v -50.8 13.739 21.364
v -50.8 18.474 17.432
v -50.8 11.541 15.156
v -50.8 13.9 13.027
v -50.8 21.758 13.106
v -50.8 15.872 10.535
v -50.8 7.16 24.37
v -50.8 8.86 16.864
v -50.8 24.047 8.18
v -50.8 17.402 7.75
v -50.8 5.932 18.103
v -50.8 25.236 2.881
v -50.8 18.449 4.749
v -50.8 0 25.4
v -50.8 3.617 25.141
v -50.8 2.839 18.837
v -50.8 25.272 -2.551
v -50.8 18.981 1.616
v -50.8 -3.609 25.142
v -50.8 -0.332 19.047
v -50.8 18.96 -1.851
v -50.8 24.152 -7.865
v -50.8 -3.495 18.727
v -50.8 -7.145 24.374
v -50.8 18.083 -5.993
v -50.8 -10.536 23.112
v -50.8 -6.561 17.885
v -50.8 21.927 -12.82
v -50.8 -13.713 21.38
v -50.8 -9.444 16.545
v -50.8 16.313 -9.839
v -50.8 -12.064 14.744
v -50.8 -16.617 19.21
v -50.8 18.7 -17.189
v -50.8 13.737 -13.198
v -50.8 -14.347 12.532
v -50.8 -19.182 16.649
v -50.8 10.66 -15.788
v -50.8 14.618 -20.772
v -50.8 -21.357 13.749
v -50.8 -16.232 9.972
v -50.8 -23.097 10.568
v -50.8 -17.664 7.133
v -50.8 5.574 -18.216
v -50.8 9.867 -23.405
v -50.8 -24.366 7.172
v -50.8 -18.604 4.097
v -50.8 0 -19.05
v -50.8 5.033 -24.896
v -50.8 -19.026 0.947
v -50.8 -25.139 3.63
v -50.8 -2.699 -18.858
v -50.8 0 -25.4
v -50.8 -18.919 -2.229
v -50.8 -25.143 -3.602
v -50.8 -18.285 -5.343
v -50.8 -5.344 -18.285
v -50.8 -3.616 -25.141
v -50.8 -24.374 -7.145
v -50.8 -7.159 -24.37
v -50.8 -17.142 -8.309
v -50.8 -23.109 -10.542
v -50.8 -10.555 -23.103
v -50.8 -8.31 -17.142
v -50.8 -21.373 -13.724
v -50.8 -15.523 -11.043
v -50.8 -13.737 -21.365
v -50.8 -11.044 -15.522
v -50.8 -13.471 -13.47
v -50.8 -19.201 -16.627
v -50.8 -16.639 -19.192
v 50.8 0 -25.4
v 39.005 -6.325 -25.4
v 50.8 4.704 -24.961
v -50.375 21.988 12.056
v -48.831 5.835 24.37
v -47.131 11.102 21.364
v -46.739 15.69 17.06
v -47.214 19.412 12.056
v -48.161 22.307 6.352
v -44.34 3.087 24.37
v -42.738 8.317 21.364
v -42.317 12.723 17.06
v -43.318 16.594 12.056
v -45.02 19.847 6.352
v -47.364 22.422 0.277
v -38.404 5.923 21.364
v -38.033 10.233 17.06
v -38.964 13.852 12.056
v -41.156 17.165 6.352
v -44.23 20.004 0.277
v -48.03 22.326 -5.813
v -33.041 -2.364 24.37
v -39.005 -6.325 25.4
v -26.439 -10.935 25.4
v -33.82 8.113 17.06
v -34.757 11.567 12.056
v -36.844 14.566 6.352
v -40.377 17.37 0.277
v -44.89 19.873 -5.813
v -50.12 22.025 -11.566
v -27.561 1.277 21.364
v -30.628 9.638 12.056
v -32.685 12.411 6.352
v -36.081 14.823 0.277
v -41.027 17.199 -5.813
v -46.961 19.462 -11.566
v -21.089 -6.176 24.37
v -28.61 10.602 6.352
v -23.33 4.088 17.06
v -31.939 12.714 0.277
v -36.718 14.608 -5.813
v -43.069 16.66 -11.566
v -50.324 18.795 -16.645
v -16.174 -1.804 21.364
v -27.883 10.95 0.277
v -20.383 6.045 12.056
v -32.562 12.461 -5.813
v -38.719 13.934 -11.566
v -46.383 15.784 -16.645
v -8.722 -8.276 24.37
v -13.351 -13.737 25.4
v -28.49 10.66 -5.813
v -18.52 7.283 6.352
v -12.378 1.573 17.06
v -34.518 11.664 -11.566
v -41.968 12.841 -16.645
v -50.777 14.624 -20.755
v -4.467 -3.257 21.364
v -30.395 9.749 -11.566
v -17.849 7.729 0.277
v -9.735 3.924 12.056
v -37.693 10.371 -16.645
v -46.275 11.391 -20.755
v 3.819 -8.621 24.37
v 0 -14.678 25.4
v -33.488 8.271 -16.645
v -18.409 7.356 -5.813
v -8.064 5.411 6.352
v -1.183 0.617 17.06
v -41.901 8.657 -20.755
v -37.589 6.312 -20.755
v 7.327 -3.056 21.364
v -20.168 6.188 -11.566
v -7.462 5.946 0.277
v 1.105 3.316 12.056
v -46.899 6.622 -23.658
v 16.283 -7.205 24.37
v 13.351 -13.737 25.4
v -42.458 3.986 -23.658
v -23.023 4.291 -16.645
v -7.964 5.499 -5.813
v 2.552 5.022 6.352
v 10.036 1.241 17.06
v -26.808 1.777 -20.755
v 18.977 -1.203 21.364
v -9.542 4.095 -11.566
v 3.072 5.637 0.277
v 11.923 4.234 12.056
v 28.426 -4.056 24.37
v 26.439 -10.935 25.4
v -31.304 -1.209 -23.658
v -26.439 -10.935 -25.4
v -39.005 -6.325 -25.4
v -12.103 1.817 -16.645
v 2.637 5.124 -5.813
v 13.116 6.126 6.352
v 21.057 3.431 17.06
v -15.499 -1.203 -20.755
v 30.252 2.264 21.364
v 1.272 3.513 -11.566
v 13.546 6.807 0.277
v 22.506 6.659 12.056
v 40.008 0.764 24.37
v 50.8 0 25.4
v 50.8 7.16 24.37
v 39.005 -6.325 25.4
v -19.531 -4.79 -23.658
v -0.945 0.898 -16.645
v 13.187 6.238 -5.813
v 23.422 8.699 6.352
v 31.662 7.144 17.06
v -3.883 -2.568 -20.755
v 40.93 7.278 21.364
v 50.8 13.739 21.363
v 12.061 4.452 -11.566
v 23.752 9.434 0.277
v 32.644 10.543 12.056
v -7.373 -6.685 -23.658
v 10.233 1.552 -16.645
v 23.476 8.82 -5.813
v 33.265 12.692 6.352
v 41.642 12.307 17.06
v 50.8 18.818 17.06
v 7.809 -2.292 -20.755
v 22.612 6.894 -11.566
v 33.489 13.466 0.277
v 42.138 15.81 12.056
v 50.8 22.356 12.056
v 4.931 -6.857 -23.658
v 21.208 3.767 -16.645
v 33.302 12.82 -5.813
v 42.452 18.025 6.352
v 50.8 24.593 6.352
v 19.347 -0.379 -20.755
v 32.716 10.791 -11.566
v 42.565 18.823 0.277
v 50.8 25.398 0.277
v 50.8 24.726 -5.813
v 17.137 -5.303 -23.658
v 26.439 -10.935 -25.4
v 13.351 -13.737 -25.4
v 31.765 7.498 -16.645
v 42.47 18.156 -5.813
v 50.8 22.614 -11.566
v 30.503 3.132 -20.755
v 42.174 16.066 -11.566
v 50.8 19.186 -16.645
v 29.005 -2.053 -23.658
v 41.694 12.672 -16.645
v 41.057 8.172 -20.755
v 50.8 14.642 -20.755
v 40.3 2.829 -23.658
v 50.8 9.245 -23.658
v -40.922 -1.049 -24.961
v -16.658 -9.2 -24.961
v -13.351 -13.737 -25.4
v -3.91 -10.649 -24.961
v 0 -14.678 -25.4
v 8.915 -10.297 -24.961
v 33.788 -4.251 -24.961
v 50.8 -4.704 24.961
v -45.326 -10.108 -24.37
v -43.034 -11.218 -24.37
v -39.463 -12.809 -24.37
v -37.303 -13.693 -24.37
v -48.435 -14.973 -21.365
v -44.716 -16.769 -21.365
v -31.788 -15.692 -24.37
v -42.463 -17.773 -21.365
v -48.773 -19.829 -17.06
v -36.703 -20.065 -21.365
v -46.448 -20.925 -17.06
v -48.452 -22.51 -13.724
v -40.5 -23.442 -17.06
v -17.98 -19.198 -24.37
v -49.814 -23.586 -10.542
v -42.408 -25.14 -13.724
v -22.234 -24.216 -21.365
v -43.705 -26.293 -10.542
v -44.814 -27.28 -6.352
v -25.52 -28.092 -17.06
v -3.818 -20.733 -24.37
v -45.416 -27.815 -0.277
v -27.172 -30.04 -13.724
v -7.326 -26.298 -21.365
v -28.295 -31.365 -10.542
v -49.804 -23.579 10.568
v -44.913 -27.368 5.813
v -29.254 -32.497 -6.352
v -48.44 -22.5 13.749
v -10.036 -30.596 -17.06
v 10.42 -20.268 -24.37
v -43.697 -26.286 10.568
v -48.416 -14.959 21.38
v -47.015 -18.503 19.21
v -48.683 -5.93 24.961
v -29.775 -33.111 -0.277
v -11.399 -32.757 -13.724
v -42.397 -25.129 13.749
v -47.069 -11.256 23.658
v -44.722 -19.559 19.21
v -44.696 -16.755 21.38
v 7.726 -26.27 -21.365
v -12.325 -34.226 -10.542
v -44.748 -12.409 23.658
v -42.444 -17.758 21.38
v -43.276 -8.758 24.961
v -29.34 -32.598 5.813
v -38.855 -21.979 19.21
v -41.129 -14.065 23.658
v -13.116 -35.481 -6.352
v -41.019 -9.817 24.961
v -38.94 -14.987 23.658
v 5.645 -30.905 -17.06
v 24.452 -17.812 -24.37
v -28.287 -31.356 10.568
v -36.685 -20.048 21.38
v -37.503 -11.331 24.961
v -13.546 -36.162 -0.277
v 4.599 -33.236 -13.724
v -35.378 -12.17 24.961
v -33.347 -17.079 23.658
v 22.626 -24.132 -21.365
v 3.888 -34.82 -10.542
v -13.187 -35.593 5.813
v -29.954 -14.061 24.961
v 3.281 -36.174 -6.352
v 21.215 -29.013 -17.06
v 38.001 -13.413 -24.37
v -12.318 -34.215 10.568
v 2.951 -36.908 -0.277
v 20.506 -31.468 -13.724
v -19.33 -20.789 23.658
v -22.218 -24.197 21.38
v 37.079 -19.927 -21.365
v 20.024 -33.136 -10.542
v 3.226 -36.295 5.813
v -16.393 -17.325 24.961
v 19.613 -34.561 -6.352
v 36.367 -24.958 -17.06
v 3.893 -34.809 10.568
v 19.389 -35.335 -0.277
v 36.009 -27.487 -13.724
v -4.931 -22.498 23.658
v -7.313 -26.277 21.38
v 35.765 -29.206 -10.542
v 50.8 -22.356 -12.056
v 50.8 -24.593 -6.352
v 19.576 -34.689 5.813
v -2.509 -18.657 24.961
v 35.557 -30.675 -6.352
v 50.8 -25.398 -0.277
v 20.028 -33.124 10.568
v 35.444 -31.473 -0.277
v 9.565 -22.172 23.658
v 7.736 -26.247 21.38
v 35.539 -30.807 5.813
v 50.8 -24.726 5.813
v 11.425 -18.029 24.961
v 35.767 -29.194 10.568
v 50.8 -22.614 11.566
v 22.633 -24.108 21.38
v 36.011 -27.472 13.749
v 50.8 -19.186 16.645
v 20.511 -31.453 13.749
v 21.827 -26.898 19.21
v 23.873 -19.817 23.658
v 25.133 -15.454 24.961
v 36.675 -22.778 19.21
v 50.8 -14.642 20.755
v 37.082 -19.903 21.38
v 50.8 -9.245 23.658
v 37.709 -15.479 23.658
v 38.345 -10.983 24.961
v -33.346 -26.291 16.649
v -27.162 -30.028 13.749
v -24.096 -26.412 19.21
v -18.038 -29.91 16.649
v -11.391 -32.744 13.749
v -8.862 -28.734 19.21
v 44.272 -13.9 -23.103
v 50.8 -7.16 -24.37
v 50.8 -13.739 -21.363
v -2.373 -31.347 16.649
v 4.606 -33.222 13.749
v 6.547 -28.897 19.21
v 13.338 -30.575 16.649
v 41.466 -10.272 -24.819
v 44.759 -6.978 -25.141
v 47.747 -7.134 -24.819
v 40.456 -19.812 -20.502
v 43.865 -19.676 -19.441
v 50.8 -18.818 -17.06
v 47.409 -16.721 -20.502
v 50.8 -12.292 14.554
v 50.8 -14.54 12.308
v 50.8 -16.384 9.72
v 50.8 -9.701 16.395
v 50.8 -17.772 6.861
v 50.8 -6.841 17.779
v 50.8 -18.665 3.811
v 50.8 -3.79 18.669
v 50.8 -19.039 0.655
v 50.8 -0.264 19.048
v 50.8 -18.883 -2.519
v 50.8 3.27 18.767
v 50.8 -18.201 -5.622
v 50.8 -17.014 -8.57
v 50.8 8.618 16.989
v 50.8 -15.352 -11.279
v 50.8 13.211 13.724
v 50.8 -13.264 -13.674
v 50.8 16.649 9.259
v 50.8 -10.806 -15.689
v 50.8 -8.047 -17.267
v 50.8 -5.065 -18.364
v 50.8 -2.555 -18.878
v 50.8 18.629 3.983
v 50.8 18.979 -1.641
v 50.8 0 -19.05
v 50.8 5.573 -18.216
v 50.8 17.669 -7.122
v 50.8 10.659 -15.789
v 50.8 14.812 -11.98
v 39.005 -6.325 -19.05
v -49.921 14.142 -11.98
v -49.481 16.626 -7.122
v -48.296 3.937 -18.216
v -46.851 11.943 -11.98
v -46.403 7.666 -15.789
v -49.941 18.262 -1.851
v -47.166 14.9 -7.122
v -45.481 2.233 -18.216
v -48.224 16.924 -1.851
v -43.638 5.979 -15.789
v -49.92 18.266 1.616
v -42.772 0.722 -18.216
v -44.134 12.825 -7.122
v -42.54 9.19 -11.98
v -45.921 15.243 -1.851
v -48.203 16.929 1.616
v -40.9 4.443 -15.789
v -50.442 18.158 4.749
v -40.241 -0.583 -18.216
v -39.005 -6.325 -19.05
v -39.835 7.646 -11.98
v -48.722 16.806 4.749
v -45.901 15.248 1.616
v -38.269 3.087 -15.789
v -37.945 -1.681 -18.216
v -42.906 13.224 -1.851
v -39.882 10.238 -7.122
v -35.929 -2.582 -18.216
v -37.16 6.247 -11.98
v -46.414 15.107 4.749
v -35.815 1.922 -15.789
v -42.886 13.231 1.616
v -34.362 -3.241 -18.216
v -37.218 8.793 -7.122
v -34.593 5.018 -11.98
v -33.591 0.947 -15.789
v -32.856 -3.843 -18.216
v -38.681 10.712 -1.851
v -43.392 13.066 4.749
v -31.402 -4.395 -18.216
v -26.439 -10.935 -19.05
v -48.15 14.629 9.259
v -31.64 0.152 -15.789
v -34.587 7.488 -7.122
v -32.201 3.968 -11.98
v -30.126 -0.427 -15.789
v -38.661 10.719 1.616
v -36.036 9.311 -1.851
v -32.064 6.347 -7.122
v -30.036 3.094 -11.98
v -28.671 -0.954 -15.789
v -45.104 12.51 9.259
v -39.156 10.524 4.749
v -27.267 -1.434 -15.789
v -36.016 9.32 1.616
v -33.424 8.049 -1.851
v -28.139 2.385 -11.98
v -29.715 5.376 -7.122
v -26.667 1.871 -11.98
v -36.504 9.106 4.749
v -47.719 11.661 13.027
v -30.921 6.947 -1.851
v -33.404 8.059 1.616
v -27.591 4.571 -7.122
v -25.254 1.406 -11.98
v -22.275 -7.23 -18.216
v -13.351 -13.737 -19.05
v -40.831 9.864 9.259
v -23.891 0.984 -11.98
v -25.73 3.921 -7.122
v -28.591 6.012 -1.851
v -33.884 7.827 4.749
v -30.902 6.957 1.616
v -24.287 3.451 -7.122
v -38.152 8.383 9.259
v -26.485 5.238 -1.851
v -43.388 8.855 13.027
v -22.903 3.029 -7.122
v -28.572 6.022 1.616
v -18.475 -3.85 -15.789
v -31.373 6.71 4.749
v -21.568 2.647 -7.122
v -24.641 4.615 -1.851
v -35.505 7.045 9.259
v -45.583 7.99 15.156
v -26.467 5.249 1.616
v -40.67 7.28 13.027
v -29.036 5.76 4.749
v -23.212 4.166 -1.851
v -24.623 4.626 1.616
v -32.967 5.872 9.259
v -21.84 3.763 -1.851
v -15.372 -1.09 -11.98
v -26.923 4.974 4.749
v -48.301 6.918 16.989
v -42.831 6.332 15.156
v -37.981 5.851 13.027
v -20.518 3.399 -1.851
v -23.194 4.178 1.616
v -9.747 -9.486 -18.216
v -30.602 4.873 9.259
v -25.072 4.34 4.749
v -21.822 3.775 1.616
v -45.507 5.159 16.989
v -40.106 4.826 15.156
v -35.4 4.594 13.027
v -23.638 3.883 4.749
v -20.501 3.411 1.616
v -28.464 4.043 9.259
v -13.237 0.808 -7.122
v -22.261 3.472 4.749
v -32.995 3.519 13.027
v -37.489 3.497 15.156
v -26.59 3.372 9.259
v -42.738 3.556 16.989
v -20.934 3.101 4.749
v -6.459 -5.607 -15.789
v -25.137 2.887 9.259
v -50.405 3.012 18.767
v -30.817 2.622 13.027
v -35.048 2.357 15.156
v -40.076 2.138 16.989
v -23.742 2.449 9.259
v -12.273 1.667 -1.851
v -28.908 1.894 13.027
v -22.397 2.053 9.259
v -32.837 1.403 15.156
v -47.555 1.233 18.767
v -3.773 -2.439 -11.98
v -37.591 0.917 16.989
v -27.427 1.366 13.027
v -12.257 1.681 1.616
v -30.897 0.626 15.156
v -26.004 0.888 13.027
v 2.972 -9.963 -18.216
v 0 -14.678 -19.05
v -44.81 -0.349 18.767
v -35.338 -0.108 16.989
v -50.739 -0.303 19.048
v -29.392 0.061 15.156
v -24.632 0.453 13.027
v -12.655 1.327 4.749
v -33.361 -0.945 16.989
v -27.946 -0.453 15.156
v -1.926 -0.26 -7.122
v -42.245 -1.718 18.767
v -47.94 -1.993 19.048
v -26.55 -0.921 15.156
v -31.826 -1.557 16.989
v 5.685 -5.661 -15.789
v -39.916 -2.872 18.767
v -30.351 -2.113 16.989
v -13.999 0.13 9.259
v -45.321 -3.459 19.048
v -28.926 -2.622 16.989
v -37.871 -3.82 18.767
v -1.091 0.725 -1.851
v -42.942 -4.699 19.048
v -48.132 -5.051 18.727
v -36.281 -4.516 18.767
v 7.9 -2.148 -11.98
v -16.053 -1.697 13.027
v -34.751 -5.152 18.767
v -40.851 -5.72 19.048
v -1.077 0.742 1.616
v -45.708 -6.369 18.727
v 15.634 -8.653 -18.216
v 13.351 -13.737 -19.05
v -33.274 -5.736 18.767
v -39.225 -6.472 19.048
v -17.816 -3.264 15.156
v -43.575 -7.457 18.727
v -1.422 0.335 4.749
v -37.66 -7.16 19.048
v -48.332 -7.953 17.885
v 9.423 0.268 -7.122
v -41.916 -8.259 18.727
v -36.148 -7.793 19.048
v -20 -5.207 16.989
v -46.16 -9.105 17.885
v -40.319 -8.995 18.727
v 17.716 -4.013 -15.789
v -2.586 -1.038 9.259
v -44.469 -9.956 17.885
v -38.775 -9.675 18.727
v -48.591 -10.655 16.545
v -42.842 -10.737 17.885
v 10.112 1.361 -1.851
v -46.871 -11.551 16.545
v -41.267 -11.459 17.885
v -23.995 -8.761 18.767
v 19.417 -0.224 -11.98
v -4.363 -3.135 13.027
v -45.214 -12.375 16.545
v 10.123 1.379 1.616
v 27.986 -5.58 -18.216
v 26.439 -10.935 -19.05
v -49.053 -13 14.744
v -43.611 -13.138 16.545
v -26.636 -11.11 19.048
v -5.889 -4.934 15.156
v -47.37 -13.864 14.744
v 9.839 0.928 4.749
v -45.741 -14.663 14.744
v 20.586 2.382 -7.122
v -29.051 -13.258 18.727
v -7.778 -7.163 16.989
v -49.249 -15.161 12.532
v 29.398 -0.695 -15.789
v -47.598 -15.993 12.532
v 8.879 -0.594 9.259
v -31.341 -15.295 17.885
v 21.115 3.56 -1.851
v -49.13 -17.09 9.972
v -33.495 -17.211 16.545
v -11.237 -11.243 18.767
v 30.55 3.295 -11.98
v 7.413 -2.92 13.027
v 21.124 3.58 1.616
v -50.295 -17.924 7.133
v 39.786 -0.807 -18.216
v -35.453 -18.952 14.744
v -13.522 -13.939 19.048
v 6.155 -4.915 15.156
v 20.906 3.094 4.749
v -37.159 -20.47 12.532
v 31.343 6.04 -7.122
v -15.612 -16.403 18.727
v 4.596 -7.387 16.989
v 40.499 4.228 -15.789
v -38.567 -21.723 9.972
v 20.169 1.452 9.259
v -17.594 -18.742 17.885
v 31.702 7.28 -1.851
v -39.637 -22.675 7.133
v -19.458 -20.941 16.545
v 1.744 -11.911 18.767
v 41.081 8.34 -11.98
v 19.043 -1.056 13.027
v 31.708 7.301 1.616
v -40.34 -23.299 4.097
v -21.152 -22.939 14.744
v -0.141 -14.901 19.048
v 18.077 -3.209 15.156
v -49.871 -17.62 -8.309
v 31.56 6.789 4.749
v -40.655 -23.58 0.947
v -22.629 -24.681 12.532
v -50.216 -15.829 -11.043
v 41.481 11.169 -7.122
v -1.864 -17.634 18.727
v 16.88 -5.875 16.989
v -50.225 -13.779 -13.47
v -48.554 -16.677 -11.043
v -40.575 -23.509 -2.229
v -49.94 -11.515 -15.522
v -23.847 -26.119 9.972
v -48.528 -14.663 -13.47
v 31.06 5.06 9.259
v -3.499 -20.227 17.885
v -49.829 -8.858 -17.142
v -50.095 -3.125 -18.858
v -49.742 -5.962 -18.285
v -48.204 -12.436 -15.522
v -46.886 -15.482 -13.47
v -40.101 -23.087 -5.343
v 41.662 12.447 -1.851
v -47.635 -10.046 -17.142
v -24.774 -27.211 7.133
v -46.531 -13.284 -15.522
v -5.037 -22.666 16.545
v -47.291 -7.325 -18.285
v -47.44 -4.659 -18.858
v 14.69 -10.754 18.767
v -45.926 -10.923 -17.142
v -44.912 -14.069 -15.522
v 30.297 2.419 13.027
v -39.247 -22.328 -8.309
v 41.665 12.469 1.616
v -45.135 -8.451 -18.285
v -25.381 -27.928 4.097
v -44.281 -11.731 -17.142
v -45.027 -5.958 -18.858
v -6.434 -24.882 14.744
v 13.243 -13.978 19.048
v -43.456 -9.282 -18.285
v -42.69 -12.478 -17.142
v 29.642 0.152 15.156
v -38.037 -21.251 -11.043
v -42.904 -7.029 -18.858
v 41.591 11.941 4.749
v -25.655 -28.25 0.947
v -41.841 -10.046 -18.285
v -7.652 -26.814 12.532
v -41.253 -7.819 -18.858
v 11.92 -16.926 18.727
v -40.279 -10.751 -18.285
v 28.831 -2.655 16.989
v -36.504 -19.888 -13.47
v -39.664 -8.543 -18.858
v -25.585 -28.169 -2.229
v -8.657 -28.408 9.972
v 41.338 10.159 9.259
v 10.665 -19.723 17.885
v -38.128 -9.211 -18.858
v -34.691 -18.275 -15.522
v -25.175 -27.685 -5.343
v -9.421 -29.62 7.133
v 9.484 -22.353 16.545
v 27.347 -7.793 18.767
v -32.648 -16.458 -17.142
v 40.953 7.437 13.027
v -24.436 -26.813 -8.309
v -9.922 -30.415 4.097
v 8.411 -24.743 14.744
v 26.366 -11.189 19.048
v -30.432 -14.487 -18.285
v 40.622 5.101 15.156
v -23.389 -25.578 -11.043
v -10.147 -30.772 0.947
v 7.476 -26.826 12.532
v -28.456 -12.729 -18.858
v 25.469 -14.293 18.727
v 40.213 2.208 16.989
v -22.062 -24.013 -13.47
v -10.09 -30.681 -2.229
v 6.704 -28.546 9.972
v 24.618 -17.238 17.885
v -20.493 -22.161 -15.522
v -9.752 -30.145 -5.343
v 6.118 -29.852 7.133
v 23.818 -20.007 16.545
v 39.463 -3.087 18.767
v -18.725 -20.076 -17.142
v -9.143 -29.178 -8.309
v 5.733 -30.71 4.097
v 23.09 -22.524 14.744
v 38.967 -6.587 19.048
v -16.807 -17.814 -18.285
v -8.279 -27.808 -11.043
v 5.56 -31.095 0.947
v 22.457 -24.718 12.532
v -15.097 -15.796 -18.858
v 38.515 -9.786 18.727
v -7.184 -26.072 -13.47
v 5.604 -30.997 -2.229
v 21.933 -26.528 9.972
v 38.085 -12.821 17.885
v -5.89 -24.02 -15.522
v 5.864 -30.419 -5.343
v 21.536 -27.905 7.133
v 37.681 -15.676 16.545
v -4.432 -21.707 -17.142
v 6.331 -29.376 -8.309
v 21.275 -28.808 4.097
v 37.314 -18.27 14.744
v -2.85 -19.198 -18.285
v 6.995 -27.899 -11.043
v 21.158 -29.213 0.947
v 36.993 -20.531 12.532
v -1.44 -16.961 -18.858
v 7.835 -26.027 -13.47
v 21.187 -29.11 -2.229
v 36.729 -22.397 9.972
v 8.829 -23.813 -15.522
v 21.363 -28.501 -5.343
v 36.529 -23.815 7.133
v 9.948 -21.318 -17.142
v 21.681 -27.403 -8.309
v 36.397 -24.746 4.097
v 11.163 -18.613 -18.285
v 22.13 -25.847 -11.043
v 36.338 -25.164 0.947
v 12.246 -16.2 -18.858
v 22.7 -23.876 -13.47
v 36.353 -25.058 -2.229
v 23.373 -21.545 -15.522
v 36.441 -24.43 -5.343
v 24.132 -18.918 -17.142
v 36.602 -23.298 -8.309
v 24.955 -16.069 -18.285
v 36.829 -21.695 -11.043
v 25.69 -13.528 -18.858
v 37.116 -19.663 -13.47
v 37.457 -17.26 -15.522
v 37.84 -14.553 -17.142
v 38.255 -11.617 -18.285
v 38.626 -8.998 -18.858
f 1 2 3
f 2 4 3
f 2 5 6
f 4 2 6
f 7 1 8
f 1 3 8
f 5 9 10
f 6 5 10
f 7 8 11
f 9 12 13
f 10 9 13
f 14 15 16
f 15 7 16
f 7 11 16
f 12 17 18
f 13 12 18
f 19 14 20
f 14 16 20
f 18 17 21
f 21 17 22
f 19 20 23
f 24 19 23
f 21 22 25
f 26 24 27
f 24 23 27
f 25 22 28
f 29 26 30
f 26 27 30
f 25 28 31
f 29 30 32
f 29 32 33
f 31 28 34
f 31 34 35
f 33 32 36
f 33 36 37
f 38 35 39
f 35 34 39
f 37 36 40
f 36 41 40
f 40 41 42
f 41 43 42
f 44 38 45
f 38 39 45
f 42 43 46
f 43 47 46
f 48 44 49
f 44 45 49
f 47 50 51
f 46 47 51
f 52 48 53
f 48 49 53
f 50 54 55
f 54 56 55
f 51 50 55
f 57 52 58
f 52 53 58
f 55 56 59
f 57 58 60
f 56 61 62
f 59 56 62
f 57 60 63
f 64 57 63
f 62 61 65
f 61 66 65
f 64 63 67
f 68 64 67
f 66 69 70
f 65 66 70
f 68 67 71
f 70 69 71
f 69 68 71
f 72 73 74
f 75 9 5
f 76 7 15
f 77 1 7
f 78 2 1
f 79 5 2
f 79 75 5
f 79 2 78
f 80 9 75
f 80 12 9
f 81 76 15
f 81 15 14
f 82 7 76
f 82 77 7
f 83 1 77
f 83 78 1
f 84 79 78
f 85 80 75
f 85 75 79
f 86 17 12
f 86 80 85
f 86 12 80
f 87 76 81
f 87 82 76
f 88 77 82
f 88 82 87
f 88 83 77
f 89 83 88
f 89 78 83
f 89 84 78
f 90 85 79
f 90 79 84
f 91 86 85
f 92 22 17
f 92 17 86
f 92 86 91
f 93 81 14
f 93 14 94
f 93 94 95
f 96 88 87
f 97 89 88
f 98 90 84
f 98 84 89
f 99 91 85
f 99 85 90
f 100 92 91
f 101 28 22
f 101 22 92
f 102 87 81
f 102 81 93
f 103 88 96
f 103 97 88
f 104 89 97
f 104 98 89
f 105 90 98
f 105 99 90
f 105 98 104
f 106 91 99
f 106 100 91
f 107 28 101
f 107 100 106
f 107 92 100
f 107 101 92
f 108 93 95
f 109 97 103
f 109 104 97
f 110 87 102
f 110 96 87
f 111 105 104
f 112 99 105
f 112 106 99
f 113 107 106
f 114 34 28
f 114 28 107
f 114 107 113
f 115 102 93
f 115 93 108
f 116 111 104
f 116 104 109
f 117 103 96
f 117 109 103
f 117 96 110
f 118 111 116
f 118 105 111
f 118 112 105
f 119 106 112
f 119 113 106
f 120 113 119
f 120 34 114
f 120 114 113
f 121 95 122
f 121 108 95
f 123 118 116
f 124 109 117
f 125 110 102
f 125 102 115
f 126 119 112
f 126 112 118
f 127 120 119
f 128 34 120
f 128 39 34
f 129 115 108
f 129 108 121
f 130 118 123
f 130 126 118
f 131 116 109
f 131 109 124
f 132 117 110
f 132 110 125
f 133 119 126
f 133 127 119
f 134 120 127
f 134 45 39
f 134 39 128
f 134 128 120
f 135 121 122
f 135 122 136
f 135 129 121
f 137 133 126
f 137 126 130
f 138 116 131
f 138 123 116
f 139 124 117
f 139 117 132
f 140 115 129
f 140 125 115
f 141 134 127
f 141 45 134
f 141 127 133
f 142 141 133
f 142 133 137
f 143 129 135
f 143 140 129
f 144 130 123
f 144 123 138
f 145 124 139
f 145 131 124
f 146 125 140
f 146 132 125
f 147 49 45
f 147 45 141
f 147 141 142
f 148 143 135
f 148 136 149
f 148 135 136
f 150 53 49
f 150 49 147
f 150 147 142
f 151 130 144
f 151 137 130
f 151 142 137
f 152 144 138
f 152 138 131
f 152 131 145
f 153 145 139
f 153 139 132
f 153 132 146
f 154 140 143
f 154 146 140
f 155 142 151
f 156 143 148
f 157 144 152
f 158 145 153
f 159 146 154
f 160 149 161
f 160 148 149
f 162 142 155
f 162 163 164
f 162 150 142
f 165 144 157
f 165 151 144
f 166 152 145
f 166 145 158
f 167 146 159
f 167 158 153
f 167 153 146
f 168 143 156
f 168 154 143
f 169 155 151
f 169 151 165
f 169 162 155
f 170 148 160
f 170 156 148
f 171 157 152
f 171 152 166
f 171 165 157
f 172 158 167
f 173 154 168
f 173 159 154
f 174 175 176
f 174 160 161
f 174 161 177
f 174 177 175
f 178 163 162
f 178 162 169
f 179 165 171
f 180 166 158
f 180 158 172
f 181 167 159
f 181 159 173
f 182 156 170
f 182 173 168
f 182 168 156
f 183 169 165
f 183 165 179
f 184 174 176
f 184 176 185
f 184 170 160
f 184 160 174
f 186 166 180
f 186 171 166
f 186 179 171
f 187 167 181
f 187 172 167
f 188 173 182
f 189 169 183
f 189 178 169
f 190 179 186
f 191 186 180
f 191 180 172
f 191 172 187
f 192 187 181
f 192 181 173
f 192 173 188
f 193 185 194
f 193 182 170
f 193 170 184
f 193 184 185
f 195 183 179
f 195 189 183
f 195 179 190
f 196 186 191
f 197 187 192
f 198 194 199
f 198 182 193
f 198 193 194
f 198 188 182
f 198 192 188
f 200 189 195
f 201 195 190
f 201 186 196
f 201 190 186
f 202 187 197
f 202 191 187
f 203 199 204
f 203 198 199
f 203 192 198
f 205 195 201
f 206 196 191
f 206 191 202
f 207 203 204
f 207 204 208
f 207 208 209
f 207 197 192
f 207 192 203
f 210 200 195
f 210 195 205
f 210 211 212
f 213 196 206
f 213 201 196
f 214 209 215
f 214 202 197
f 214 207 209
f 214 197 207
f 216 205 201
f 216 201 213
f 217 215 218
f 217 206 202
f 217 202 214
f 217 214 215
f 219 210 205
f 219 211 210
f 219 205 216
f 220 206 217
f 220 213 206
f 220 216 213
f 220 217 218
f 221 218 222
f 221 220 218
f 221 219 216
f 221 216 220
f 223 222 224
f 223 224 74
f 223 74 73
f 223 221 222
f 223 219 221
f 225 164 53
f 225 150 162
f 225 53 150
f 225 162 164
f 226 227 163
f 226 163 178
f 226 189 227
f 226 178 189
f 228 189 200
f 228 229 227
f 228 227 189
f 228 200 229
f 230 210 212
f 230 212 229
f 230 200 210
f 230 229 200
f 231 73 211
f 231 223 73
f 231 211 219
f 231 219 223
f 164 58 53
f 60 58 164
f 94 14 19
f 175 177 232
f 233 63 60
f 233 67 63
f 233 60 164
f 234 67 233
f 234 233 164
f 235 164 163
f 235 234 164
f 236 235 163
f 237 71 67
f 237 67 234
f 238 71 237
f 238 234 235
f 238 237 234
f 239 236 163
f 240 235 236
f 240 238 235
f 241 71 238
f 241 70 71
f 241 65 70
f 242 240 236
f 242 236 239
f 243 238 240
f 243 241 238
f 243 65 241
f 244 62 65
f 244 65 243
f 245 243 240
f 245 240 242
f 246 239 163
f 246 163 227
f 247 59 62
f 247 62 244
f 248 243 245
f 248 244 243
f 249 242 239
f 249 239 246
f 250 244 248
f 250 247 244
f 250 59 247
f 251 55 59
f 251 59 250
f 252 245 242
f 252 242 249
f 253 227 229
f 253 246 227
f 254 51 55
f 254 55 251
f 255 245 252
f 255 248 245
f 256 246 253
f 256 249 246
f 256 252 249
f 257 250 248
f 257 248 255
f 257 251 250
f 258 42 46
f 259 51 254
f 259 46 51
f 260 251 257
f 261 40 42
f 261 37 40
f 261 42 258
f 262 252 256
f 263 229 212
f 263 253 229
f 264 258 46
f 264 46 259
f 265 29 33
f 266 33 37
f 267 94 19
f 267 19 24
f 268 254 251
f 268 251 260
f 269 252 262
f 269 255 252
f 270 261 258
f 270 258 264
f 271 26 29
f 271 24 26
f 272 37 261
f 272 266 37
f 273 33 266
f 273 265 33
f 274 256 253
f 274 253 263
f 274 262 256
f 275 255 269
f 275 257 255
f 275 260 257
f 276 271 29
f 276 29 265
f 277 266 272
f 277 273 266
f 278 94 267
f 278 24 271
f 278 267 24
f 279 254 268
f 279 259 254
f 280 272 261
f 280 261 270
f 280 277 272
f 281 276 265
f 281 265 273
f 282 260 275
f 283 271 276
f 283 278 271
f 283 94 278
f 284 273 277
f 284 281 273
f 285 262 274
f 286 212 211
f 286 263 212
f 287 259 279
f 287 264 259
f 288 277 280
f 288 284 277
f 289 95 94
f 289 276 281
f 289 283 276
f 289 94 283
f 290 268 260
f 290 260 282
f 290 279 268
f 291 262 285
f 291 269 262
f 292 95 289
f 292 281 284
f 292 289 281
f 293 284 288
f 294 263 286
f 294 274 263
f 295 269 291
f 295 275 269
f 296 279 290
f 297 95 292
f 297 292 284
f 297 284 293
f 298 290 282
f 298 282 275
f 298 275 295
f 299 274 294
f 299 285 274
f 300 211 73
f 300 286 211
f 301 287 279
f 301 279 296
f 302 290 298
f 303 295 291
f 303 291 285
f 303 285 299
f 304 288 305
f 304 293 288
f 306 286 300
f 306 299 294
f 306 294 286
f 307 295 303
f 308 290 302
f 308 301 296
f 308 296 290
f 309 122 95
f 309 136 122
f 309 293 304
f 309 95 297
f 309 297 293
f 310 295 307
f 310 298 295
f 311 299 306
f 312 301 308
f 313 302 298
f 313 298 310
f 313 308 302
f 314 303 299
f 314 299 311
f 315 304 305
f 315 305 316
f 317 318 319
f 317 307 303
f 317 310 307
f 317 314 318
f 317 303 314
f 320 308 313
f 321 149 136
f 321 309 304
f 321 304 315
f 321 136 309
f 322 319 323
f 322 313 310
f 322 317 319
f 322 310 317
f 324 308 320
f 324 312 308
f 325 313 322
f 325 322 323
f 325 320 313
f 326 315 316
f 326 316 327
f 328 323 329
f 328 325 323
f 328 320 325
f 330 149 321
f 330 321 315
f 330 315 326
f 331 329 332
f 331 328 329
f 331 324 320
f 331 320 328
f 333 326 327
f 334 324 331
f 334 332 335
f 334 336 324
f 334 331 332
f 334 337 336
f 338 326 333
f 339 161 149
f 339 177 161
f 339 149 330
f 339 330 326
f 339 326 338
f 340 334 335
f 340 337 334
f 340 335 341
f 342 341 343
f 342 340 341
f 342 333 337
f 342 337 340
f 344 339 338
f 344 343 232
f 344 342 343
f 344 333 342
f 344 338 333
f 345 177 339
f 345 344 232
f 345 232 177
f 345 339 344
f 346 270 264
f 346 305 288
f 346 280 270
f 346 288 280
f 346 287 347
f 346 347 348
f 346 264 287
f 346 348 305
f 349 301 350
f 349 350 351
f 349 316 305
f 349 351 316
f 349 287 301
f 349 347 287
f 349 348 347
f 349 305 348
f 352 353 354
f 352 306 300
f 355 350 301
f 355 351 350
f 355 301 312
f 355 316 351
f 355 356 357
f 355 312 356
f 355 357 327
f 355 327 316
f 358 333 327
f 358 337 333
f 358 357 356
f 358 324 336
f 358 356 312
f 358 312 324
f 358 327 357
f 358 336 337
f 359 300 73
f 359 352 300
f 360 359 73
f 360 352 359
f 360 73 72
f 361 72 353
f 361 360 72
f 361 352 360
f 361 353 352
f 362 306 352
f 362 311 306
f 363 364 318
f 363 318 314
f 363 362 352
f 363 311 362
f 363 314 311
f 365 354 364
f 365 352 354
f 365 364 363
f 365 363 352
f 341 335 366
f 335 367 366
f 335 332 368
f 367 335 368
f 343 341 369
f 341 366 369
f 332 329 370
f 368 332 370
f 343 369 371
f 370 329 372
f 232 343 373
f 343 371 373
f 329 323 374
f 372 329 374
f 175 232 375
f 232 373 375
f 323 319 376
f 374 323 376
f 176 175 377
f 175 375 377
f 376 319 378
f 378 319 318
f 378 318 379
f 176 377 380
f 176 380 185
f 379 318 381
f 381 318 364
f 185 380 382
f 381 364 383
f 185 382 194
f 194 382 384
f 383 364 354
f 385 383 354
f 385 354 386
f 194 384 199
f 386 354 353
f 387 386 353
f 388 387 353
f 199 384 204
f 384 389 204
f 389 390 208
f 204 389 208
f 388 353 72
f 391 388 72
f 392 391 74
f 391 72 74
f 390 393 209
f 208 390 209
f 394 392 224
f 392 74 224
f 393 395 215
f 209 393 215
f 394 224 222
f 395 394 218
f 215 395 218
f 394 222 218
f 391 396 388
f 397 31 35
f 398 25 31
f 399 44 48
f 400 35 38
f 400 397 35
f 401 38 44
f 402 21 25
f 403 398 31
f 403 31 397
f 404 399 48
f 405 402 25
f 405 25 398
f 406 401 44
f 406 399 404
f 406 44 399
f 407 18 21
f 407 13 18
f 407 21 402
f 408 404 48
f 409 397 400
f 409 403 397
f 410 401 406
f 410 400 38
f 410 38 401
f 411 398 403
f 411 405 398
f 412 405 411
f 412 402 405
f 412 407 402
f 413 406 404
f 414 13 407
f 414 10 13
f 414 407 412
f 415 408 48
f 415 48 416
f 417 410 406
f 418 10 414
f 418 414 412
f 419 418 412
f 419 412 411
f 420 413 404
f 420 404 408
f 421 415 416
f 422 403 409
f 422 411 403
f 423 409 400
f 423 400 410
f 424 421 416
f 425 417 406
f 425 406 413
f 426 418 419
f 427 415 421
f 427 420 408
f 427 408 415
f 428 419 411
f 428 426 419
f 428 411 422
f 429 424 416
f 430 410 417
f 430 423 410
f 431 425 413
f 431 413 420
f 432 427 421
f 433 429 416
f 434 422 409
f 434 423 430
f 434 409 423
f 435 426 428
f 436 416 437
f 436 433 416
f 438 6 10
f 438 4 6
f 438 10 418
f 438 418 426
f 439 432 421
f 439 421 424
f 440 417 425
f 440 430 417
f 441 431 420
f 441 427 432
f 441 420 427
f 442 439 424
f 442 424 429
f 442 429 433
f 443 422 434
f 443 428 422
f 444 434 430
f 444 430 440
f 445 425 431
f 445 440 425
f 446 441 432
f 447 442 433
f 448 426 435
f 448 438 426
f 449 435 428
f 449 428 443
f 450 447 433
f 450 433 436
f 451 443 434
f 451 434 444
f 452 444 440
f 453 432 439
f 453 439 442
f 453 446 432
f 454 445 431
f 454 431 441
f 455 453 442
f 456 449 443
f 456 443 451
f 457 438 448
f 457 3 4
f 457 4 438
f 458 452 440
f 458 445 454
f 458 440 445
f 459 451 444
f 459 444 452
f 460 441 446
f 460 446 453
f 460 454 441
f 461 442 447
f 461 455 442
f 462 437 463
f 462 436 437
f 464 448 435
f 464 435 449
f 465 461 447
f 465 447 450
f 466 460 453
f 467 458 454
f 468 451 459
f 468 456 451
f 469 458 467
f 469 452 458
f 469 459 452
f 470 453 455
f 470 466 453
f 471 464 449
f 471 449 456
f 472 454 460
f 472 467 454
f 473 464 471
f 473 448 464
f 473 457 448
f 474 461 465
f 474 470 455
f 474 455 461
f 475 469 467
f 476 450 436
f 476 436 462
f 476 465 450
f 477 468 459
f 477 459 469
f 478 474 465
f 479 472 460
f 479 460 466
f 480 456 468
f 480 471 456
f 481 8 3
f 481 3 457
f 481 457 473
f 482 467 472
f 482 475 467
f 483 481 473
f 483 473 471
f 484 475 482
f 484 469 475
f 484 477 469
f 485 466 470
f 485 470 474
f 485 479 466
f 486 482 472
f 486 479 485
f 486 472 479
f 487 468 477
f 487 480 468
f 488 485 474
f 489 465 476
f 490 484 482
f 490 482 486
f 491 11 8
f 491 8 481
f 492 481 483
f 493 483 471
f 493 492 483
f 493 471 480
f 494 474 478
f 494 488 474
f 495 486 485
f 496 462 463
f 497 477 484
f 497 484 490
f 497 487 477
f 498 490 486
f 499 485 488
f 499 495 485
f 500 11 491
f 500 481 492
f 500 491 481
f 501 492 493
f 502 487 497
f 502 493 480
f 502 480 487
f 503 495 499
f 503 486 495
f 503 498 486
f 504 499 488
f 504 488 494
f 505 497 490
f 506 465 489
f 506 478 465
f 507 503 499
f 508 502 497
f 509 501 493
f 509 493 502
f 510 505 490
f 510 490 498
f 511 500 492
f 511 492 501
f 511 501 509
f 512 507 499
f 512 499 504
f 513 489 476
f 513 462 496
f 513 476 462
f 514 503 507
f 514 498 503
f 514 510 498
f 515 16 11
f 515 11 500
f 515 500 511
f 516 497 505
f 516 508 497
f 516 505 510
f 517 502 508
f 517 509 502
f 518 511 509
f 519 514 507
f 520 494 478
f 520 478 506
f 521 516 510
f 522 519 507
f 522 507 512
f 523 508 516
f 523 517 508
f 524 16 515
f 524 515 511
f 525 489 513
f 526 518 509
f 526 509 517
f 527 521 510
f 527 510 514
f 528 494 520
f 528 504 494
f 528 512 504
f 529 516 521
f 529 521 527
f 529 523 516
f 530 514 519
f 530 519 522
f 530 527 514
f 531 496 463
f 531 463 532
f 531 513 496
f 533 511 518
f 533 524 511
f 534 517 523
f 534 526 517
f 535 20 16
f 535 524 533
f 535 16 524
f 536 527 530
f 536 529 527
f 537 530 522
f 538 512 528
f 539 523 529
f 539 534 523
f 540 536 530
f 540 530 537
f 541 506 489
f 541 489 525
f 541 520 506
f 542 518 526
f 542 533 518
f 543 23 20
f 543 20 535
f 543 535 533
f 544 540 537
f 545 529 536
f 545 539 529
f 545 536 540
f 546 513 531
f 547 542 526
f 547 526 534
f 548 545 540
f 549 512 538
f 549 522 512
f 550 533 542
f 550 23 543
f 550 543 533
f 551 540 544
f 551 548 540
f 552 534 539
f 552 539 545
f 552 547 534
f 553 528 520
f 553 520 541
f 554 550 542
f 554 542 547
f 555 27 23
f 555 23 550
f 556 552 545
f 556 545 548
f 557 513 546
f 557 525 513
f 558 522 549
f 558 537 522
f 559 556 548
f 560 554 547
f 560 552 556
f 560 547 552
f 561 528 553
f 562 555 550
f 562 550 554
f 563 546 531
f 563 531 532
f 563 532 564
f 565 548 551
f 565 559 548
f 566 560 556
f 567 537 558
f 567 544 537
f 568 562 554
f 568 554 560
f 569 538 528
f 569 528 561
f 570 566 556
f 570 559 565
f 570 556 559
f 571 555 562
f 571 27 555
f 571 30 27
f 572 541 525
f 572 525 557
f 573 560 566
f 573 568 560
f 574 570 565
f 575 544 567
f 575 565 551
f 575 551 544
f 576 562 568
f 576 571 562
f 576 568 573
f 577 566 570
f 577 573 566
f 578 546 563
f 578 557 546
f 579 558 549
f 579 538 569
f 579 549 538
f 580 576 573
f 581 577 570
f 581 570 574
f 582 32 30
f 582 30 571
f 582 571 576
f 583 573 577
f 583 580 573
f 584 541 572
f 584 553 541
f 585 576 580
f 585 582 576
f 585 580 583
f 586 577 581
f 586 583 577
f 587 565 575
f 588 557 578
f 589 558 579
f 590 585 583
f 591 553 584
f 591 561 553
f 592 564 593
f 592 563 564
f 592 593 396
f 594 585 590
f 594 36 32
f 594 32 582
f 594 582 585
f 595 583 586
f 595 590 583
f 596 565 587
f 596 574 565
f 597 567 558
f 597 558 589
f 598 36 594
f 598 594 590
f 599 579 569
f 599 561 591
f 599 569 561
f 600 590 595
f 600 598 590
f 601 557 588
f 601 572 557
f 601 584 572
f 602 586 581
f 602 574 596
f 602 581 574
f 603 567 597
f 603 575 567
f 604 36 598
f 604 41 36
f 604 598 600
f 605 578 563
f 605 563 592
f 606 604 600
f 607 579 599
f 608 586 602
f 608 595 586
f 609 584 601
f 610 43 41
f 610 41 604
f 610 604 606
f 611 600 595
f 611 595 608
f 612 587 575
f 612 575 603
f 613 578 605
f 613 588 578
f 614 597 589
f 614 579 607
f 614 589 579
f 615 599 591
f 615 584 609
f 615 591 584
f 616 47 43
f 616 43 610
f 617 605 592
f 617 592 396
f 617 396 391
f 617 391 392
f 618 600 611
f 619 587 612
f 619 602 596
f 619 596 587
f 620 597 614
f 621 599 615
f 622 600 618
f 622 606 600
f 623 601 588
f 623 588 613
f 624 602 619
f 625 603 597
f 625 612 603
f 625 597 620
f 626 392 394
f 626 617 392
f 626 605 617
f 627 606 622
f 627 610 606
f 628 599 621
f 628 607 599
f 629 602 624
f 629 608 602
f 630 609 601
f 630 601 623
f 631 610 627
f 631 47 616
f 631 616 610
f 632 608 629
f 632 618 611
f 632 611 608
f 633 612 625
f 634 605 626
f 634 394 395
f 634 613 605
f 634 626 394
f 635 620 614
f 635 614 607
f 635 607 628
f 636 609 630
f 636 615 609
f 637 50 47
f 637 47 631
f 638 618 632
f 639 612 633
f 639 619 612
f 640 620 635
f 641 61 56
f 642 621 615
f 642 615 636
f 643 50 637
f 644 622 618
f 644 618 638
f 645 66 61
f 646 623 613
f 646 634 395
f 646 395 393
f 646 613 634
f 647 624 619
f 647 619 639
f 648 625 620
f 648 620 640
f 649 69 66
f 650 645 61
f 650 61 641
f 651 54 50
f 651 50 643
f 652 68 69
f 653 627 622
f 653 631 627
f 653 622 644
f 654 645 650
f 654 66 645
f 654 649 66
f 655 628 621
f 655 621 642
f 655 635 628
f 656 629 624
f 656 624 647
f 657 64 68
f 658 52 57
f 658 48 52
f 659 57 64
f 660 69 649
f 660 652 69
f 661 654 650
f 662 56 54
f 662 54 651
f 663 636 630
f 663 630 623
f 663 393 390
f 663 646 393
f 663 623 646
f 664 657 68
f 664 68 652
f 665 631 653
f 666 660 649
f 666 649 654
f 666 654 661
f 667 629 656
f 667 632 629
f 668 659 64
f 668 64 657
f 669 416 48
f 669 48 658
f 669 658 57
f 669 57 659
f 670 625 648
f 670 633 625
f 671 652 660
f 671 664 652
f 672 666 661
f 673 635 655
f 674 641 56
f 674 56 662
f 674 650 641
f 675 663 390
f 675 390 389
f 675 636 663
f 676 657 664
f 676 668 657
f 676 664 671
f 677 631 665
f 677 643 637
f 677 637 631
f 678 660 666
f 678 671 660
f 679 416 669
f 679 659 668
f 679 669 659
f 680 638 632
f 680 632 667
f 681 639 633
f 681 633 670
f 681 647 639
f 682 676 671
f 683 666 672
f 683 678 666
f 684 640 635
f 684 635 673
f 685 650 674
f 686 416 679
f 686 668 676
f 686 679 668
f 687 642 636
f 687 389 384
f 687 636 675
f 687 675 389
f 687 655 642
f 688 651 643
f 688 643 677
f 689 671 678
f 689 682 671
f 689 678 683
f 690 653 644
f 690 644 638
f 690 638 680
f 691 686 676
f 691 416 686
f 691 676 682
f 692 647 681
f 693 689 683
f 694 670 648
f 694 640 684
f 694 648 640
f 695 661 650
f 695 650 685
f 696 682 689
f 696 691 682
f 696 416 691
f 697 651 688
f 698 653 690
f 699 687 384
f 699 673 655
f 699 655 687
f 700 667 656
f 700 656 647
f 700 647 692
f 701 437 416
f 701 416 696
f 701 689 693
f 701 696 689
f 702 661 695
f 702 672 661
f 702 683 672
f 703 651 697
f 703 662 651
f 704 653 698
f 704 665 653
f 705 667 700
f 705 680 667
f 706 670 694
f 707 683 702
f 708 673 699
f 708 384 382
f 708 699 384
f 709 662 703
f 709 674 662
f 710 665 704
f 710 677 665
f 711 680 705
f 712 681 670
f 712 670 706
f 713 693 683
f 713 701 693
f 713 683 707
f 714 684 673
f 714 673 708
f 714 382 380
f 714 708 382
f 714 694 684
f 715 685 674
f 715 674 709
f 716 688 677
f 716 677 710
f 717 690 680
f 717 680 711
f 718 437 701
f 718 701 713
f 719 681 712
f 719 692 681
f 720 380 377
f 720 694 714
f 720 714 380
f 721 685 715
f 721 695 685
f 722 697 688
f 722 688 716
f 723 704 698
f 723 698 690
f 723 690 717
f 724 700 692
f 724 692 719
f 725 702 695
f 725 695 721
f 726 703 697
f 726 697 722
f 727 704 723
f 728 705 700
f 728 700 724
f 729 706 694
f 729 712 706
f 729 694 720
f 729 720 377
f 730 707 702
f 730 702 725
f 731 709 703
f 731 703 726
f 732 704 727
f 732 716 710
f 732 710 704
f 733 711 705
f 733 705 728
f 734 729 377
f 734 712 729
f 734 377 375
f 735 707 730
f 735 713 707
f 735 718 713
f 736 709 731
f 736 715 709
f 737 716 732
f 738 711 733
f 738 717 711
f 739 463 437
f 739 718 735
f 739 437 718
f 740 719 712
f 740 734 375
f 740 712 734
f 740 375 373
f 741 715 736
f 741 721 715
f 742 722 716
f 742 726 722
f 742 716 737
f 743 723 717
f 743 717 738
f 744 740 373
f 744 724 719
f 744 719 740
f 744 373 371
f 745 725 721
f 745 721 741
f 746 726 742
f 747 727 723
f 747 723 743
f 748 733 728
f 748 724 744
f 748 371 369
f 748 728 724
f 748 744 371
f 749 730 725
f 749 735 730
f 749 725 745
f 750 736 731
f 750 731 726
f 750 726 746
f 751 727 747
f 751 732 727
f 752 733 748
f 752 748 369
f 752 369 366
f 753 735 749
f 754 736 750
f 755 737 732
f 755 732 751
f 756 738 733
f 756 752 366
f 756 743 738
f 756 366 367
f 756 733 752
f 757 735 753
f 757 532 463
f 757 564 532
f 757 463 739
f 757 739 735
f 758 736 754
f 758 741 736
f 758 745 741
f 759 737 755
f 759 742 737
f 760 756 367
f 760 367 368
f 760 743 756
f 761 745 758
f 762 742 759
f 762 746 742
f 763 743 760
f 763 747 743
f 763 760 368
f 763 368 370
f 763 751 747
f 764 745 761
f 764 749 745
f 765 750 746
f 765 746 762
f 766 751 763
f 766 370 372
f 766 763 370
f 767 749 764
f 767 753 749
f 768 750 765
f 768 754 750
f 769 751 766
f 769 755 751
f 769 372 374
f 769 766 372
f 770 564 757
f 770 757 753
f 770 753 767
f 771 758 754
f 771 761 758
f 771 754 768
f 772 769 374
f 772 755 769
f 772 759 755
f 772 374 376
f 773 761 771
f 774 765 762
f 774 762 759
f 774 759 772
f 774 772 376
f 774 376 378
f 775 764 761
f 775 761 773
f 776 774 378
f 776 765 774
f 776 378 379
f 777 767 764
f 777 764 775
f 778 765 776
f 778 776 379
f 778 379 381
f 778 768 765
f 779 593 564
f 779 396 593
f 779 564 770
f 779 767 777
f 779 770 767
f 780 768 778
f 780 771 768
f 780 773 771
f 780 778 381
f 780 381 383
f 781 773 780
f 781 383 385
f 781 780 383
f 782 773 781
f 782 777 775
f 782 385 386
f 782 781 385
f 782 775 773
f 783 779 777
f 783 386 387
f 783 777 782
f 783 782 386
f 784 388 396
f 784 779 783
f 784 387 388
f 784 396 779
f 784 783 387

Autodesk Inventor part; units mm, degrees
ref_plane "YZ Plane" through (0, 0, 0) normal (1, 0, 0) x (0, 1, 0)
ref_plane "XZ Plane" through (0, 0, 0) normal (0, 1, 0) x (-1, 0, 0)
ref_plane "XY Plane" through (0, 0, 0) normal (0, 0, 1) x (1, 0, 0)
sketch "Sketch1" plane through (0, 0, 0) normal (0, 0, 1) x (1, 0, 0)
  line L0 (-50.8, -41.275) -> (50.8, -41.275)
  line L1 (50.8, -41.275) -> (50.8, 41.275)
  line L2 (50.8, 41.275) -> (-50.8, 41.275)
  line L3 (-50.8, 41.275) -> (-50.8, -41.275)
  line L4 (-50.8, -41.275) -> (50.8, 41.275) construction
  line L5 (50.8, -41.275) -> (-50.8, 41.275) construction
  point P0 (0, 0)
  dimension "d0" = 101.6
  dimension "d1" = 82.55
extrude "Extrusion1" add sketch "Sketch1" along normal mid plane 50.8
sketch "Sketch2" plane through (50.8, -41.275, 25.4) normal (1, 0, 0) x (0, 0, -1)
  line L0 (50.8, 82.55) -> (50.8, 0) construction
  line L1 (50.8, 0) -> (0, 0) construction
  line L2 (0, 0) -> (0, 82.55) construction
  line L3 (0, 82.55) -> (50.8, 82.55) construction
  circle A0 centre (25.4, 41.275) radius 19.05
  line L4 (50.8, 82.55) -> (0, 82.55) construction
  dimension "d4" = 38.1
sketch "Sketch3" plane through (0, 0, 0) normal (0, 0, 1) x (1, 0, 0)
  line L0 (50.8, -41.275) -> (-50.8, -41.275) construction
  line L1 (-50.8, -41.275) -> (-50.8, 41.275) construction
  line L2 (-50.8, 41.275) -> (50.8, 41.275) construction
  line L3 (50.8, 41.275) -> (50.8, -41.275) construction
  arc A0 (-50.8, 0) -> (50.8, 0) centre (0, 80.5725) ccw construction
  circle A1 centre (0, 80.5725) radius 95.25
  point P0 (0, 0)
  dimension "d5" = 95.25
sweep "Sweep1" cut profiles "Sketch2" path "Sketch3"
sketch "Sketch7" plane through (50.8, -41.275, 25.4) normal (1, 0, 0) x (0, 0, -1)
  circle A0 centre (25.4, 41.275) radius 19.05 construction
  line L0 (50.8, 82.55) -> (50.8, 0) construction
  line L1 (50.8, 0) -> (0, 0) construction
  line L2 (0, 0) -> (0, 82.55) construction
  line L3 (0, 82.55) -> (50.8, 82.55) construction
  circle A1 centre (25.4, 41.275) radius 25.4
  line L4 (0, 0) -> (0, 82.55) construction
  line L5 (0, 41.275) -> (50.8, 41.275)
  line L6 (50.8, 41.275) -> (50.8, 107.95)
  line L7 (50.8, 107.95) -> (0, 107.95)
  line L8 (0, 107.95) -> (0, 41.275)
  line L9 (50.8, 82.55) -> (50.8, 0) construction
  line L10 (0, 41.275) -> (50.8, 41.275)
  line L11 (50.8, 41.275) -> (50.8, -25.4)
  line L12 (50.8, -25.4) -> (0, -25.4)
  line L13 (0, -25.4) -> (0, 41.275)
  point P0 (25.4, 41.275)
  point P1 (25.4, -25.4)
  dimension "d20" = 6.35
  dimension "d21" = 25.4
  dimension "d22" = 25.4
sweep "Sweep5" cut profiles "Sketch7" path "Sketch3" contours A1 L8 L7 L6
sweep "Sweep6" cut profiles "Sketch7" path "Sketch3" contours L11 L12 L13 A1
sketch "Sketch8" plane through (0, 0, 25.4) normal (0, 0, 1) x (1, 0, 0)
  arc A0 (-35.0641, 41.275) -> (35.0641, 41.275) centre (0, 80.5725) ccw construction
  line L0 (-35.0641, 41.275) -> (35.0641, 41.275)
  line L1 (35.0641, 41.275) -> (35.0641, 27.9058)
  line L2 (35.0641, 27.9058) -> (-35.0641, 27.9058)
  line L3 (-35.0641, 27.9058) -> (-35.0641, 41.275)
  arc A1 (-50.8, 0) -> (50.8, 0) centre (0, 80.5725) ccw construction
  arc A2 (-35.0641, 41.275) -> (35.0641, 41.275) centre (0, 80.5725) ccw construction
  line L4 (-35.0641, 41.275) -> (35.0641, 41.275) construction
  arc A3 (-35.0641, 41.275) -> (35.0641, 41.275) centre (0, 80.5725) ccw construction
  point P0 (0, 0)
extrude "Extrusion3" cut sketch "Sketch8" against normal through all
equation "\"d22\" = d21"
properties part number "EL2-024" material "Aluminum 6061"
